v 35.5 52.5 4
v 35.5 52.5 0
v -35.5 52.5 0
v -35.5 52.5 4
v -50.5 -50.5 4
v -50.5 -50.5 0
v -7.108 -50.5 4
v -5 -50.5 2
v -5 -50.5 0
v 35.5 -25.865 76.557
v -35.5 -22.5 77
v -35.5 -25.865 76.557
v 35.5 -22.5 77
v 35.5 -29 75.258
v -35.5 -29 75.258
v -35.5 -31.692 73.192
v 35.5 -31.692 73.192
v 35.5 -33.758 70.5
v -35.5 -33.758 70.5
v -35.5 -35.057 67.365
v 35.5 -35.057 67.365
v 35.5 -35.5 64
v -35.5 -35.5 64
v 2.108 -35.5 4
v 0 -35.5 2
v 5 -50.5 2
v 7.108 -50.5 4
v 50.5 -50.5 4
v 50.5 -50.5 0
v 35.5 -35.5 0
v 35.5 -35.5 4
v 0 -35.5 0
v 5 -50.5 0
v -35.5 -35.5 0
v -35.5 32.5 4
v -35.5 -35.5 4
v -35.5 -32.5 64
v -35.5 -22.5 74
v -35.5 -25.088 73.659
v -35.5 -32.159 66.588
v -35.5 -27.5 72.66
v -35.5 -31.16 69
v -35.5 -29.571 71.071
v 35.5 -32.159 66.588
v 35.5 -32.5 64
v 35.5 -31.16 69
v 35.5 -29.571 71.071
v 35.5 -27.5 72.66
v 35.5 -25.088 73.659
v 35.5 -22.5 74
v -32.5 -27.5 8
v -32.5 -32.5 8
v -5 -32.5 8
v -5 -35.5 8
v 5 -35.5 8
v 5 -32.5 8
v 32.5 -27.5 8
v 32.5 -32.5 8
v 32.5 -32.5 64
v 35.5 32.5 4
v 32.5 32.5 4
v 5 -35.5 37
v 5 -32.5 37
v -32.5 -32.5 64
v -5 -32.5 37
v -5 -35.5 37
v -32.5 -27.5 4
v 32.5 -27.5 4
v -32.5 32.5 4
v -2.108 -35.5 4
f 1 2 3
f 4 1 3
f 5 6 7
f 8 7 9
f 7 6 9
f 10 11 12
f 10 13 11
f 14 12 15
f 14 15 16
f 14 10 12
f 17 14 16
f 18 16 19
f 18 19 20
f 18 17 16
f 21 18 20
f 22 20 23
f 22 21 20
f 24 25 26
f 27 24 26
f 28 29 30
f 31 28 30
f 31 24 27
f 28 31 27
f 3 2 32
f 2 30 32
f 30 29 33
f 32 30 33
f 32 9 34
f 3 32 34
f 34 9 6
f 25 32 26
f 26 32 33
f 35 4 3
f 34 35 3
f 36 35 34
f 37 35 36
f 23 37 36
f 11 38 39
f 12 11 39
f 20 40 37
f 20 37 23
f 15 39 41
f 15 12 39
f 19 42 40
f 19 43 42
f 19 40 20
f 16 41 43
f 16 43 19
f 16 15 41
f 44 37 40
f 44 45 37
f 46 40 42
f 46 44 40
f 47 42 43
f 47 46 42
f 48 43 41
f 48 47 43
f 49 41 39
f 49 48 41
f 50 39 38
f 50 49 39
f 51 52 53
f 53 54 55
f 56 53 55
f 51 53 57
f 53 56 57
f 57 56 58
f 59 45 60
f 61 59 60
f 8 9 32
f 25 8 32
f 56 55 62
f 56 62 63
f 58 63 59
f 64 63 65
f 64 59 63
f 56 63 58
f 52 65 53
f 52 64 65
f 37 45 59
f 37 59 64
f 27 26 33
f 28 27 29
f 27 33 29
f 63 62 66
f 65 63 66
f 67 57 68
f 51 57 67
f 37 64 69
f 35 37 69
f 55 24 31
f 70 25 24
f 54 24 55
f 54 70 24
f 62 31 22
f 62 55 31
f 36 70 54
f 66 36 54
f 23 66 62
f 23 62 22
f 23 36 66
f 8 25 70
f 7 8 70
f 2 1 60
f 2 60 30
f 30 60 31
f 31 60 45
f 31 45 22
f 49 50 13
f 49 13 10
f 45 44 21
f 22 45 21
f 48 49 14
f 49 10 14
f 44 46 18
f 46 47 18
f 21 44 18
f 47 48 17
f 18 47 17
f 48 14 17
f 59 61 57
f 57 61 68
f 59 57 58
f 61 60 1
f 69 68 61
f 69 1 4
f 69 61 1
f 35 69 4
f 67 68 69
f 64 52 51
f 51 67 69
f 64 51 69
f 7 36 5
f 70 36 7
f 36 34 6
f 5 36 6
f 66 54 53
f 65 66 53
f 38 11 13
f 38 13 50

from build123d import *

# Parameters (mm, degrees)
F0_W         = 65
F0_H         = 65
F1_DEPTH     = 4
F3_DEPTH     = 60
F5_DEPTH     = 105.7
F7_DEPTH     = 25
F8_T4_DEPTH  = 26.0981202527
F8_T10_DEPTH = 26.0981202527
F9_SIZE      = 2
F10_DEPTH    = 20
F11_DEPTH    = 3
F12_DEPTH    = 3
F14_DEPTH    = 5
F15_DEPTH    = 15
F16_DEPTH    = 15
F18_DEPTH    = 71
F19_R        = 9.99999
F20_R        = 12.99999


# Not quite as in the source:
# - a fillet or chamfer that OpenCascade refuses, or shapes differently, is made with other operations: its cross-section is extruded or revolved along the edge and cut away or added
# - a fillet or chamfer is up to 0.001 mm smaller than in the source, because OpenCascade refuses the exact size


with BuildPart() as f1:
    # F0 (on Top) → F1 (new body)
    with BuildSketch(Plane.XY):
        Rectangle(F0_W, F0_H)
        Polygon((32.5, -32.5), (-32.5, -32.5), (-32.5, 32.5), (-35.5, 32.5), (-35.5, -35.5), (0, -35.5), (35.5, -35.5), (35.5, 32.5), (32.5, 32.5), align=None)
        Polygon((0, -35.5), (-35.5, -35.5), (-35.5, -50.5), (-5, -50.5), align=None)
        Polygon((-35.5, -50.5), (-35.5, -35.5), (-50.5, -50.5), align=None)
        Polygon((35.5, -50.5), (35.5, -35.5), (0, -35.5), (5, -50.5), (5.9827403165, -50.5), align=None)
        Polygon((50.5, -50.5), (35.5, -35.5), (35.5, -50.5), align=None)
    extrude(amount=F1_DEPTH)

    # F2 (on face) → F3 (join)
    with BuildSketch(Plane.XY.offset(4)):
        Polygon((32.5, -32.5), (-32.5, -32.5), (-32.5, 32.5), (-35.5, 32.5), (-35.5, -35.5), (0, -35.5), (35.5, -35.5), (35.5, 32.5), (32.5, 32.5), align=None)
    extrude(amount=F3_DEPTH)

    # F4 (on face) → F5 (cut)
    with BuildSketch(Plane.YZ.offset(35.5)):
        Polygon((-32.5, 64), (32.5, 4), (32.5, 64), align=None)
    extrude(amount=-F5_DEPTH, mode=Mode.SUBTRACT)

    # F6 (on face) → F7 (cut)
    with BuildSketch(Plane.XZ.offset(35.5)):
        Polygon((-5, 8), (0, 8), (3.482630942, 8), (25, 8), (25, 19), (5, 19), (5, 37), (0, 37), (-5, 37), (-5, 19), (-25, 19), (-25, 8), align=None)
    extrude(amount=-F7_DEPTH, mode=Mode.SUBTRACT)

    # F8: chamfer of 2 on 1 edges, made by hand


with BuildPart() as f8_tool2:
    # F8_s3 → F8_t4 (new body)
    with BuildSketch(Plane(origin=(-17.2764751324, -51.8294253971, 0), x_dir=(0, 0, 1), z_dir=(0.316227766, 0.9486832981, 0))):
        Polygon((2, 11.2260856936), (4, 9.2260856936), (4, 11.2260856936), align=None)
    extrude(amount=F8_T4_DEPTH)

    split(bisect_by=Plane.XZ.offset(35.5), keep=Keep.TOP)

    split(bisect_by=Plane(origin=(-10.65, -3.55, 0), x_dir=(0, 0, 1), z_dir=(-0.9486832981, -0.316227766, 0)), keep=Keep.TOP)


with BuildPart() as f1_1:
    add(f1.part)

    # F8_t1: cut F8_tool2
    add(f8_tool2.part, mode=Mode.SUBTRACT)


with BuildPart() as f8_tool8:
    # F8_s9 → F8_t10 (new body)
    with BuildSketch(Plane(origin=(-17.2764751324, -51.8294253971, 0), x_dir=(0, 0, 1), z_dir=(0.316227766, 0.9486832981, 0))):
        Polygon((2, 11.2260856936), (4, 9.2260856936), (4, 11.2260856936), align=None)
    extrude(amount=F8_T10_DEPTH)

    split(bisect_by=Plane.XZ.offset(32.5), keep=Keep.BOTTOM)

    split(bisect_by=Plane(origin=(-10.65, -3.55, 0), x_dir=(0, 0, 1), z_dir=(-0.9486832981, -0.316227766, 0)), keep=Keep.TOP)


with BuildPart() as f1_2:
    add(f1_1.part)

    # F8_t7: cut F8_tool8
    add(f8_tool8.part, mode=Mode.SUBTRACT)

    # F9
    f9_edges = [f1_2.edges().sort_by_distance(p)[0] for p in [
        (2.5, -43, 4),
    ]]
    chamfer(f9_edges, length=F9_SIZE)

    # F10 (add): a face of the model
    f10_faces = [f1_2.faces().sort_by_distance(p)[0] for p in [
        (0, 32.5, 2),
    ]]
    extrude(f10_faces, amount=F10_DEPTH)

    # F11 (add): a face of the model
    f11_faces = [f1_2.faces().sort_by_distance(p)[0] for p in [
        (15, -34, 19),
    ]]
    extrude(f11_faces, amount=-F11_DEPTH)

    # F12 (add): a face of the model
    f12_faces = [f1_2.faces().sort_by_distance(p)[0] for p in [
        (-15, -34, 19),
    ]]
    extrude(f12_faces, amount=-F12_DEPTH)

    # F13 (on face) → F14 (join)
    with BuildSketch(Plane(origin=(0, -32.5, 0), x_dir=(-1, 0, 0), z_dir=(0, 1, 0))):
        Polygon((32.5, 8), (25, 8), (-25, 8), (-32.5, 8), (-32.5, 4), (1, 4), (1, 3.8973665961), (1.1081851068, 4), (32.5, 4), align=None)
    extrude(amount=F14_DEPTH)

    # F15 (add): a face of the model
    f15_faces = [f1_2.faces().sort_by_distance(p)[0] for p in [
        (15, -34, 19),
    ]]
    extrude(f15_faces, amount=F15_DEPTH)

    # F16 (add): a face of the model
    f16_faces = [f1_2.faces().sort_by_distance(p)[0] for p in [
        (-15, -34, 19),
    ]]
    extrude(f16_faces, amount=F16_DEPTH)

    # F17 (on face) → F18 (join)
    with BuildSketch(Plane(origin=(-35.5, 0, 0), x_dir=(0, -1, 0), z_dir=(-1, 0, 0))):
        Polygon((32.5, 74), (32.5, 64), (35.5, 64), (35.5, 77), (22.5, 77), (22.5, 74), align=None)
    extrude(amount=-F18_DEPTH)

    # F19 (radius 10 in the source; OpenCascade refuses exactly that, so slightly less here)
    f19_edges = [f1_2.edges().sort_by_distance(p)[0] for p in [
        (0, -32.5, 74),
    ]]
    fillet(f19_edges, radius=F19_R)

    # F20 (radius 13 in the source; OpenCascade refuses exactly that, so slightly less here)
    f20_edges = [f1_2.edges().sort_by_distance(p)[0] for p in [
        (0, -35.5, 77),
    ]]
    fillet(f20_edges, radius=F20_R)


solid = f1_2.part
